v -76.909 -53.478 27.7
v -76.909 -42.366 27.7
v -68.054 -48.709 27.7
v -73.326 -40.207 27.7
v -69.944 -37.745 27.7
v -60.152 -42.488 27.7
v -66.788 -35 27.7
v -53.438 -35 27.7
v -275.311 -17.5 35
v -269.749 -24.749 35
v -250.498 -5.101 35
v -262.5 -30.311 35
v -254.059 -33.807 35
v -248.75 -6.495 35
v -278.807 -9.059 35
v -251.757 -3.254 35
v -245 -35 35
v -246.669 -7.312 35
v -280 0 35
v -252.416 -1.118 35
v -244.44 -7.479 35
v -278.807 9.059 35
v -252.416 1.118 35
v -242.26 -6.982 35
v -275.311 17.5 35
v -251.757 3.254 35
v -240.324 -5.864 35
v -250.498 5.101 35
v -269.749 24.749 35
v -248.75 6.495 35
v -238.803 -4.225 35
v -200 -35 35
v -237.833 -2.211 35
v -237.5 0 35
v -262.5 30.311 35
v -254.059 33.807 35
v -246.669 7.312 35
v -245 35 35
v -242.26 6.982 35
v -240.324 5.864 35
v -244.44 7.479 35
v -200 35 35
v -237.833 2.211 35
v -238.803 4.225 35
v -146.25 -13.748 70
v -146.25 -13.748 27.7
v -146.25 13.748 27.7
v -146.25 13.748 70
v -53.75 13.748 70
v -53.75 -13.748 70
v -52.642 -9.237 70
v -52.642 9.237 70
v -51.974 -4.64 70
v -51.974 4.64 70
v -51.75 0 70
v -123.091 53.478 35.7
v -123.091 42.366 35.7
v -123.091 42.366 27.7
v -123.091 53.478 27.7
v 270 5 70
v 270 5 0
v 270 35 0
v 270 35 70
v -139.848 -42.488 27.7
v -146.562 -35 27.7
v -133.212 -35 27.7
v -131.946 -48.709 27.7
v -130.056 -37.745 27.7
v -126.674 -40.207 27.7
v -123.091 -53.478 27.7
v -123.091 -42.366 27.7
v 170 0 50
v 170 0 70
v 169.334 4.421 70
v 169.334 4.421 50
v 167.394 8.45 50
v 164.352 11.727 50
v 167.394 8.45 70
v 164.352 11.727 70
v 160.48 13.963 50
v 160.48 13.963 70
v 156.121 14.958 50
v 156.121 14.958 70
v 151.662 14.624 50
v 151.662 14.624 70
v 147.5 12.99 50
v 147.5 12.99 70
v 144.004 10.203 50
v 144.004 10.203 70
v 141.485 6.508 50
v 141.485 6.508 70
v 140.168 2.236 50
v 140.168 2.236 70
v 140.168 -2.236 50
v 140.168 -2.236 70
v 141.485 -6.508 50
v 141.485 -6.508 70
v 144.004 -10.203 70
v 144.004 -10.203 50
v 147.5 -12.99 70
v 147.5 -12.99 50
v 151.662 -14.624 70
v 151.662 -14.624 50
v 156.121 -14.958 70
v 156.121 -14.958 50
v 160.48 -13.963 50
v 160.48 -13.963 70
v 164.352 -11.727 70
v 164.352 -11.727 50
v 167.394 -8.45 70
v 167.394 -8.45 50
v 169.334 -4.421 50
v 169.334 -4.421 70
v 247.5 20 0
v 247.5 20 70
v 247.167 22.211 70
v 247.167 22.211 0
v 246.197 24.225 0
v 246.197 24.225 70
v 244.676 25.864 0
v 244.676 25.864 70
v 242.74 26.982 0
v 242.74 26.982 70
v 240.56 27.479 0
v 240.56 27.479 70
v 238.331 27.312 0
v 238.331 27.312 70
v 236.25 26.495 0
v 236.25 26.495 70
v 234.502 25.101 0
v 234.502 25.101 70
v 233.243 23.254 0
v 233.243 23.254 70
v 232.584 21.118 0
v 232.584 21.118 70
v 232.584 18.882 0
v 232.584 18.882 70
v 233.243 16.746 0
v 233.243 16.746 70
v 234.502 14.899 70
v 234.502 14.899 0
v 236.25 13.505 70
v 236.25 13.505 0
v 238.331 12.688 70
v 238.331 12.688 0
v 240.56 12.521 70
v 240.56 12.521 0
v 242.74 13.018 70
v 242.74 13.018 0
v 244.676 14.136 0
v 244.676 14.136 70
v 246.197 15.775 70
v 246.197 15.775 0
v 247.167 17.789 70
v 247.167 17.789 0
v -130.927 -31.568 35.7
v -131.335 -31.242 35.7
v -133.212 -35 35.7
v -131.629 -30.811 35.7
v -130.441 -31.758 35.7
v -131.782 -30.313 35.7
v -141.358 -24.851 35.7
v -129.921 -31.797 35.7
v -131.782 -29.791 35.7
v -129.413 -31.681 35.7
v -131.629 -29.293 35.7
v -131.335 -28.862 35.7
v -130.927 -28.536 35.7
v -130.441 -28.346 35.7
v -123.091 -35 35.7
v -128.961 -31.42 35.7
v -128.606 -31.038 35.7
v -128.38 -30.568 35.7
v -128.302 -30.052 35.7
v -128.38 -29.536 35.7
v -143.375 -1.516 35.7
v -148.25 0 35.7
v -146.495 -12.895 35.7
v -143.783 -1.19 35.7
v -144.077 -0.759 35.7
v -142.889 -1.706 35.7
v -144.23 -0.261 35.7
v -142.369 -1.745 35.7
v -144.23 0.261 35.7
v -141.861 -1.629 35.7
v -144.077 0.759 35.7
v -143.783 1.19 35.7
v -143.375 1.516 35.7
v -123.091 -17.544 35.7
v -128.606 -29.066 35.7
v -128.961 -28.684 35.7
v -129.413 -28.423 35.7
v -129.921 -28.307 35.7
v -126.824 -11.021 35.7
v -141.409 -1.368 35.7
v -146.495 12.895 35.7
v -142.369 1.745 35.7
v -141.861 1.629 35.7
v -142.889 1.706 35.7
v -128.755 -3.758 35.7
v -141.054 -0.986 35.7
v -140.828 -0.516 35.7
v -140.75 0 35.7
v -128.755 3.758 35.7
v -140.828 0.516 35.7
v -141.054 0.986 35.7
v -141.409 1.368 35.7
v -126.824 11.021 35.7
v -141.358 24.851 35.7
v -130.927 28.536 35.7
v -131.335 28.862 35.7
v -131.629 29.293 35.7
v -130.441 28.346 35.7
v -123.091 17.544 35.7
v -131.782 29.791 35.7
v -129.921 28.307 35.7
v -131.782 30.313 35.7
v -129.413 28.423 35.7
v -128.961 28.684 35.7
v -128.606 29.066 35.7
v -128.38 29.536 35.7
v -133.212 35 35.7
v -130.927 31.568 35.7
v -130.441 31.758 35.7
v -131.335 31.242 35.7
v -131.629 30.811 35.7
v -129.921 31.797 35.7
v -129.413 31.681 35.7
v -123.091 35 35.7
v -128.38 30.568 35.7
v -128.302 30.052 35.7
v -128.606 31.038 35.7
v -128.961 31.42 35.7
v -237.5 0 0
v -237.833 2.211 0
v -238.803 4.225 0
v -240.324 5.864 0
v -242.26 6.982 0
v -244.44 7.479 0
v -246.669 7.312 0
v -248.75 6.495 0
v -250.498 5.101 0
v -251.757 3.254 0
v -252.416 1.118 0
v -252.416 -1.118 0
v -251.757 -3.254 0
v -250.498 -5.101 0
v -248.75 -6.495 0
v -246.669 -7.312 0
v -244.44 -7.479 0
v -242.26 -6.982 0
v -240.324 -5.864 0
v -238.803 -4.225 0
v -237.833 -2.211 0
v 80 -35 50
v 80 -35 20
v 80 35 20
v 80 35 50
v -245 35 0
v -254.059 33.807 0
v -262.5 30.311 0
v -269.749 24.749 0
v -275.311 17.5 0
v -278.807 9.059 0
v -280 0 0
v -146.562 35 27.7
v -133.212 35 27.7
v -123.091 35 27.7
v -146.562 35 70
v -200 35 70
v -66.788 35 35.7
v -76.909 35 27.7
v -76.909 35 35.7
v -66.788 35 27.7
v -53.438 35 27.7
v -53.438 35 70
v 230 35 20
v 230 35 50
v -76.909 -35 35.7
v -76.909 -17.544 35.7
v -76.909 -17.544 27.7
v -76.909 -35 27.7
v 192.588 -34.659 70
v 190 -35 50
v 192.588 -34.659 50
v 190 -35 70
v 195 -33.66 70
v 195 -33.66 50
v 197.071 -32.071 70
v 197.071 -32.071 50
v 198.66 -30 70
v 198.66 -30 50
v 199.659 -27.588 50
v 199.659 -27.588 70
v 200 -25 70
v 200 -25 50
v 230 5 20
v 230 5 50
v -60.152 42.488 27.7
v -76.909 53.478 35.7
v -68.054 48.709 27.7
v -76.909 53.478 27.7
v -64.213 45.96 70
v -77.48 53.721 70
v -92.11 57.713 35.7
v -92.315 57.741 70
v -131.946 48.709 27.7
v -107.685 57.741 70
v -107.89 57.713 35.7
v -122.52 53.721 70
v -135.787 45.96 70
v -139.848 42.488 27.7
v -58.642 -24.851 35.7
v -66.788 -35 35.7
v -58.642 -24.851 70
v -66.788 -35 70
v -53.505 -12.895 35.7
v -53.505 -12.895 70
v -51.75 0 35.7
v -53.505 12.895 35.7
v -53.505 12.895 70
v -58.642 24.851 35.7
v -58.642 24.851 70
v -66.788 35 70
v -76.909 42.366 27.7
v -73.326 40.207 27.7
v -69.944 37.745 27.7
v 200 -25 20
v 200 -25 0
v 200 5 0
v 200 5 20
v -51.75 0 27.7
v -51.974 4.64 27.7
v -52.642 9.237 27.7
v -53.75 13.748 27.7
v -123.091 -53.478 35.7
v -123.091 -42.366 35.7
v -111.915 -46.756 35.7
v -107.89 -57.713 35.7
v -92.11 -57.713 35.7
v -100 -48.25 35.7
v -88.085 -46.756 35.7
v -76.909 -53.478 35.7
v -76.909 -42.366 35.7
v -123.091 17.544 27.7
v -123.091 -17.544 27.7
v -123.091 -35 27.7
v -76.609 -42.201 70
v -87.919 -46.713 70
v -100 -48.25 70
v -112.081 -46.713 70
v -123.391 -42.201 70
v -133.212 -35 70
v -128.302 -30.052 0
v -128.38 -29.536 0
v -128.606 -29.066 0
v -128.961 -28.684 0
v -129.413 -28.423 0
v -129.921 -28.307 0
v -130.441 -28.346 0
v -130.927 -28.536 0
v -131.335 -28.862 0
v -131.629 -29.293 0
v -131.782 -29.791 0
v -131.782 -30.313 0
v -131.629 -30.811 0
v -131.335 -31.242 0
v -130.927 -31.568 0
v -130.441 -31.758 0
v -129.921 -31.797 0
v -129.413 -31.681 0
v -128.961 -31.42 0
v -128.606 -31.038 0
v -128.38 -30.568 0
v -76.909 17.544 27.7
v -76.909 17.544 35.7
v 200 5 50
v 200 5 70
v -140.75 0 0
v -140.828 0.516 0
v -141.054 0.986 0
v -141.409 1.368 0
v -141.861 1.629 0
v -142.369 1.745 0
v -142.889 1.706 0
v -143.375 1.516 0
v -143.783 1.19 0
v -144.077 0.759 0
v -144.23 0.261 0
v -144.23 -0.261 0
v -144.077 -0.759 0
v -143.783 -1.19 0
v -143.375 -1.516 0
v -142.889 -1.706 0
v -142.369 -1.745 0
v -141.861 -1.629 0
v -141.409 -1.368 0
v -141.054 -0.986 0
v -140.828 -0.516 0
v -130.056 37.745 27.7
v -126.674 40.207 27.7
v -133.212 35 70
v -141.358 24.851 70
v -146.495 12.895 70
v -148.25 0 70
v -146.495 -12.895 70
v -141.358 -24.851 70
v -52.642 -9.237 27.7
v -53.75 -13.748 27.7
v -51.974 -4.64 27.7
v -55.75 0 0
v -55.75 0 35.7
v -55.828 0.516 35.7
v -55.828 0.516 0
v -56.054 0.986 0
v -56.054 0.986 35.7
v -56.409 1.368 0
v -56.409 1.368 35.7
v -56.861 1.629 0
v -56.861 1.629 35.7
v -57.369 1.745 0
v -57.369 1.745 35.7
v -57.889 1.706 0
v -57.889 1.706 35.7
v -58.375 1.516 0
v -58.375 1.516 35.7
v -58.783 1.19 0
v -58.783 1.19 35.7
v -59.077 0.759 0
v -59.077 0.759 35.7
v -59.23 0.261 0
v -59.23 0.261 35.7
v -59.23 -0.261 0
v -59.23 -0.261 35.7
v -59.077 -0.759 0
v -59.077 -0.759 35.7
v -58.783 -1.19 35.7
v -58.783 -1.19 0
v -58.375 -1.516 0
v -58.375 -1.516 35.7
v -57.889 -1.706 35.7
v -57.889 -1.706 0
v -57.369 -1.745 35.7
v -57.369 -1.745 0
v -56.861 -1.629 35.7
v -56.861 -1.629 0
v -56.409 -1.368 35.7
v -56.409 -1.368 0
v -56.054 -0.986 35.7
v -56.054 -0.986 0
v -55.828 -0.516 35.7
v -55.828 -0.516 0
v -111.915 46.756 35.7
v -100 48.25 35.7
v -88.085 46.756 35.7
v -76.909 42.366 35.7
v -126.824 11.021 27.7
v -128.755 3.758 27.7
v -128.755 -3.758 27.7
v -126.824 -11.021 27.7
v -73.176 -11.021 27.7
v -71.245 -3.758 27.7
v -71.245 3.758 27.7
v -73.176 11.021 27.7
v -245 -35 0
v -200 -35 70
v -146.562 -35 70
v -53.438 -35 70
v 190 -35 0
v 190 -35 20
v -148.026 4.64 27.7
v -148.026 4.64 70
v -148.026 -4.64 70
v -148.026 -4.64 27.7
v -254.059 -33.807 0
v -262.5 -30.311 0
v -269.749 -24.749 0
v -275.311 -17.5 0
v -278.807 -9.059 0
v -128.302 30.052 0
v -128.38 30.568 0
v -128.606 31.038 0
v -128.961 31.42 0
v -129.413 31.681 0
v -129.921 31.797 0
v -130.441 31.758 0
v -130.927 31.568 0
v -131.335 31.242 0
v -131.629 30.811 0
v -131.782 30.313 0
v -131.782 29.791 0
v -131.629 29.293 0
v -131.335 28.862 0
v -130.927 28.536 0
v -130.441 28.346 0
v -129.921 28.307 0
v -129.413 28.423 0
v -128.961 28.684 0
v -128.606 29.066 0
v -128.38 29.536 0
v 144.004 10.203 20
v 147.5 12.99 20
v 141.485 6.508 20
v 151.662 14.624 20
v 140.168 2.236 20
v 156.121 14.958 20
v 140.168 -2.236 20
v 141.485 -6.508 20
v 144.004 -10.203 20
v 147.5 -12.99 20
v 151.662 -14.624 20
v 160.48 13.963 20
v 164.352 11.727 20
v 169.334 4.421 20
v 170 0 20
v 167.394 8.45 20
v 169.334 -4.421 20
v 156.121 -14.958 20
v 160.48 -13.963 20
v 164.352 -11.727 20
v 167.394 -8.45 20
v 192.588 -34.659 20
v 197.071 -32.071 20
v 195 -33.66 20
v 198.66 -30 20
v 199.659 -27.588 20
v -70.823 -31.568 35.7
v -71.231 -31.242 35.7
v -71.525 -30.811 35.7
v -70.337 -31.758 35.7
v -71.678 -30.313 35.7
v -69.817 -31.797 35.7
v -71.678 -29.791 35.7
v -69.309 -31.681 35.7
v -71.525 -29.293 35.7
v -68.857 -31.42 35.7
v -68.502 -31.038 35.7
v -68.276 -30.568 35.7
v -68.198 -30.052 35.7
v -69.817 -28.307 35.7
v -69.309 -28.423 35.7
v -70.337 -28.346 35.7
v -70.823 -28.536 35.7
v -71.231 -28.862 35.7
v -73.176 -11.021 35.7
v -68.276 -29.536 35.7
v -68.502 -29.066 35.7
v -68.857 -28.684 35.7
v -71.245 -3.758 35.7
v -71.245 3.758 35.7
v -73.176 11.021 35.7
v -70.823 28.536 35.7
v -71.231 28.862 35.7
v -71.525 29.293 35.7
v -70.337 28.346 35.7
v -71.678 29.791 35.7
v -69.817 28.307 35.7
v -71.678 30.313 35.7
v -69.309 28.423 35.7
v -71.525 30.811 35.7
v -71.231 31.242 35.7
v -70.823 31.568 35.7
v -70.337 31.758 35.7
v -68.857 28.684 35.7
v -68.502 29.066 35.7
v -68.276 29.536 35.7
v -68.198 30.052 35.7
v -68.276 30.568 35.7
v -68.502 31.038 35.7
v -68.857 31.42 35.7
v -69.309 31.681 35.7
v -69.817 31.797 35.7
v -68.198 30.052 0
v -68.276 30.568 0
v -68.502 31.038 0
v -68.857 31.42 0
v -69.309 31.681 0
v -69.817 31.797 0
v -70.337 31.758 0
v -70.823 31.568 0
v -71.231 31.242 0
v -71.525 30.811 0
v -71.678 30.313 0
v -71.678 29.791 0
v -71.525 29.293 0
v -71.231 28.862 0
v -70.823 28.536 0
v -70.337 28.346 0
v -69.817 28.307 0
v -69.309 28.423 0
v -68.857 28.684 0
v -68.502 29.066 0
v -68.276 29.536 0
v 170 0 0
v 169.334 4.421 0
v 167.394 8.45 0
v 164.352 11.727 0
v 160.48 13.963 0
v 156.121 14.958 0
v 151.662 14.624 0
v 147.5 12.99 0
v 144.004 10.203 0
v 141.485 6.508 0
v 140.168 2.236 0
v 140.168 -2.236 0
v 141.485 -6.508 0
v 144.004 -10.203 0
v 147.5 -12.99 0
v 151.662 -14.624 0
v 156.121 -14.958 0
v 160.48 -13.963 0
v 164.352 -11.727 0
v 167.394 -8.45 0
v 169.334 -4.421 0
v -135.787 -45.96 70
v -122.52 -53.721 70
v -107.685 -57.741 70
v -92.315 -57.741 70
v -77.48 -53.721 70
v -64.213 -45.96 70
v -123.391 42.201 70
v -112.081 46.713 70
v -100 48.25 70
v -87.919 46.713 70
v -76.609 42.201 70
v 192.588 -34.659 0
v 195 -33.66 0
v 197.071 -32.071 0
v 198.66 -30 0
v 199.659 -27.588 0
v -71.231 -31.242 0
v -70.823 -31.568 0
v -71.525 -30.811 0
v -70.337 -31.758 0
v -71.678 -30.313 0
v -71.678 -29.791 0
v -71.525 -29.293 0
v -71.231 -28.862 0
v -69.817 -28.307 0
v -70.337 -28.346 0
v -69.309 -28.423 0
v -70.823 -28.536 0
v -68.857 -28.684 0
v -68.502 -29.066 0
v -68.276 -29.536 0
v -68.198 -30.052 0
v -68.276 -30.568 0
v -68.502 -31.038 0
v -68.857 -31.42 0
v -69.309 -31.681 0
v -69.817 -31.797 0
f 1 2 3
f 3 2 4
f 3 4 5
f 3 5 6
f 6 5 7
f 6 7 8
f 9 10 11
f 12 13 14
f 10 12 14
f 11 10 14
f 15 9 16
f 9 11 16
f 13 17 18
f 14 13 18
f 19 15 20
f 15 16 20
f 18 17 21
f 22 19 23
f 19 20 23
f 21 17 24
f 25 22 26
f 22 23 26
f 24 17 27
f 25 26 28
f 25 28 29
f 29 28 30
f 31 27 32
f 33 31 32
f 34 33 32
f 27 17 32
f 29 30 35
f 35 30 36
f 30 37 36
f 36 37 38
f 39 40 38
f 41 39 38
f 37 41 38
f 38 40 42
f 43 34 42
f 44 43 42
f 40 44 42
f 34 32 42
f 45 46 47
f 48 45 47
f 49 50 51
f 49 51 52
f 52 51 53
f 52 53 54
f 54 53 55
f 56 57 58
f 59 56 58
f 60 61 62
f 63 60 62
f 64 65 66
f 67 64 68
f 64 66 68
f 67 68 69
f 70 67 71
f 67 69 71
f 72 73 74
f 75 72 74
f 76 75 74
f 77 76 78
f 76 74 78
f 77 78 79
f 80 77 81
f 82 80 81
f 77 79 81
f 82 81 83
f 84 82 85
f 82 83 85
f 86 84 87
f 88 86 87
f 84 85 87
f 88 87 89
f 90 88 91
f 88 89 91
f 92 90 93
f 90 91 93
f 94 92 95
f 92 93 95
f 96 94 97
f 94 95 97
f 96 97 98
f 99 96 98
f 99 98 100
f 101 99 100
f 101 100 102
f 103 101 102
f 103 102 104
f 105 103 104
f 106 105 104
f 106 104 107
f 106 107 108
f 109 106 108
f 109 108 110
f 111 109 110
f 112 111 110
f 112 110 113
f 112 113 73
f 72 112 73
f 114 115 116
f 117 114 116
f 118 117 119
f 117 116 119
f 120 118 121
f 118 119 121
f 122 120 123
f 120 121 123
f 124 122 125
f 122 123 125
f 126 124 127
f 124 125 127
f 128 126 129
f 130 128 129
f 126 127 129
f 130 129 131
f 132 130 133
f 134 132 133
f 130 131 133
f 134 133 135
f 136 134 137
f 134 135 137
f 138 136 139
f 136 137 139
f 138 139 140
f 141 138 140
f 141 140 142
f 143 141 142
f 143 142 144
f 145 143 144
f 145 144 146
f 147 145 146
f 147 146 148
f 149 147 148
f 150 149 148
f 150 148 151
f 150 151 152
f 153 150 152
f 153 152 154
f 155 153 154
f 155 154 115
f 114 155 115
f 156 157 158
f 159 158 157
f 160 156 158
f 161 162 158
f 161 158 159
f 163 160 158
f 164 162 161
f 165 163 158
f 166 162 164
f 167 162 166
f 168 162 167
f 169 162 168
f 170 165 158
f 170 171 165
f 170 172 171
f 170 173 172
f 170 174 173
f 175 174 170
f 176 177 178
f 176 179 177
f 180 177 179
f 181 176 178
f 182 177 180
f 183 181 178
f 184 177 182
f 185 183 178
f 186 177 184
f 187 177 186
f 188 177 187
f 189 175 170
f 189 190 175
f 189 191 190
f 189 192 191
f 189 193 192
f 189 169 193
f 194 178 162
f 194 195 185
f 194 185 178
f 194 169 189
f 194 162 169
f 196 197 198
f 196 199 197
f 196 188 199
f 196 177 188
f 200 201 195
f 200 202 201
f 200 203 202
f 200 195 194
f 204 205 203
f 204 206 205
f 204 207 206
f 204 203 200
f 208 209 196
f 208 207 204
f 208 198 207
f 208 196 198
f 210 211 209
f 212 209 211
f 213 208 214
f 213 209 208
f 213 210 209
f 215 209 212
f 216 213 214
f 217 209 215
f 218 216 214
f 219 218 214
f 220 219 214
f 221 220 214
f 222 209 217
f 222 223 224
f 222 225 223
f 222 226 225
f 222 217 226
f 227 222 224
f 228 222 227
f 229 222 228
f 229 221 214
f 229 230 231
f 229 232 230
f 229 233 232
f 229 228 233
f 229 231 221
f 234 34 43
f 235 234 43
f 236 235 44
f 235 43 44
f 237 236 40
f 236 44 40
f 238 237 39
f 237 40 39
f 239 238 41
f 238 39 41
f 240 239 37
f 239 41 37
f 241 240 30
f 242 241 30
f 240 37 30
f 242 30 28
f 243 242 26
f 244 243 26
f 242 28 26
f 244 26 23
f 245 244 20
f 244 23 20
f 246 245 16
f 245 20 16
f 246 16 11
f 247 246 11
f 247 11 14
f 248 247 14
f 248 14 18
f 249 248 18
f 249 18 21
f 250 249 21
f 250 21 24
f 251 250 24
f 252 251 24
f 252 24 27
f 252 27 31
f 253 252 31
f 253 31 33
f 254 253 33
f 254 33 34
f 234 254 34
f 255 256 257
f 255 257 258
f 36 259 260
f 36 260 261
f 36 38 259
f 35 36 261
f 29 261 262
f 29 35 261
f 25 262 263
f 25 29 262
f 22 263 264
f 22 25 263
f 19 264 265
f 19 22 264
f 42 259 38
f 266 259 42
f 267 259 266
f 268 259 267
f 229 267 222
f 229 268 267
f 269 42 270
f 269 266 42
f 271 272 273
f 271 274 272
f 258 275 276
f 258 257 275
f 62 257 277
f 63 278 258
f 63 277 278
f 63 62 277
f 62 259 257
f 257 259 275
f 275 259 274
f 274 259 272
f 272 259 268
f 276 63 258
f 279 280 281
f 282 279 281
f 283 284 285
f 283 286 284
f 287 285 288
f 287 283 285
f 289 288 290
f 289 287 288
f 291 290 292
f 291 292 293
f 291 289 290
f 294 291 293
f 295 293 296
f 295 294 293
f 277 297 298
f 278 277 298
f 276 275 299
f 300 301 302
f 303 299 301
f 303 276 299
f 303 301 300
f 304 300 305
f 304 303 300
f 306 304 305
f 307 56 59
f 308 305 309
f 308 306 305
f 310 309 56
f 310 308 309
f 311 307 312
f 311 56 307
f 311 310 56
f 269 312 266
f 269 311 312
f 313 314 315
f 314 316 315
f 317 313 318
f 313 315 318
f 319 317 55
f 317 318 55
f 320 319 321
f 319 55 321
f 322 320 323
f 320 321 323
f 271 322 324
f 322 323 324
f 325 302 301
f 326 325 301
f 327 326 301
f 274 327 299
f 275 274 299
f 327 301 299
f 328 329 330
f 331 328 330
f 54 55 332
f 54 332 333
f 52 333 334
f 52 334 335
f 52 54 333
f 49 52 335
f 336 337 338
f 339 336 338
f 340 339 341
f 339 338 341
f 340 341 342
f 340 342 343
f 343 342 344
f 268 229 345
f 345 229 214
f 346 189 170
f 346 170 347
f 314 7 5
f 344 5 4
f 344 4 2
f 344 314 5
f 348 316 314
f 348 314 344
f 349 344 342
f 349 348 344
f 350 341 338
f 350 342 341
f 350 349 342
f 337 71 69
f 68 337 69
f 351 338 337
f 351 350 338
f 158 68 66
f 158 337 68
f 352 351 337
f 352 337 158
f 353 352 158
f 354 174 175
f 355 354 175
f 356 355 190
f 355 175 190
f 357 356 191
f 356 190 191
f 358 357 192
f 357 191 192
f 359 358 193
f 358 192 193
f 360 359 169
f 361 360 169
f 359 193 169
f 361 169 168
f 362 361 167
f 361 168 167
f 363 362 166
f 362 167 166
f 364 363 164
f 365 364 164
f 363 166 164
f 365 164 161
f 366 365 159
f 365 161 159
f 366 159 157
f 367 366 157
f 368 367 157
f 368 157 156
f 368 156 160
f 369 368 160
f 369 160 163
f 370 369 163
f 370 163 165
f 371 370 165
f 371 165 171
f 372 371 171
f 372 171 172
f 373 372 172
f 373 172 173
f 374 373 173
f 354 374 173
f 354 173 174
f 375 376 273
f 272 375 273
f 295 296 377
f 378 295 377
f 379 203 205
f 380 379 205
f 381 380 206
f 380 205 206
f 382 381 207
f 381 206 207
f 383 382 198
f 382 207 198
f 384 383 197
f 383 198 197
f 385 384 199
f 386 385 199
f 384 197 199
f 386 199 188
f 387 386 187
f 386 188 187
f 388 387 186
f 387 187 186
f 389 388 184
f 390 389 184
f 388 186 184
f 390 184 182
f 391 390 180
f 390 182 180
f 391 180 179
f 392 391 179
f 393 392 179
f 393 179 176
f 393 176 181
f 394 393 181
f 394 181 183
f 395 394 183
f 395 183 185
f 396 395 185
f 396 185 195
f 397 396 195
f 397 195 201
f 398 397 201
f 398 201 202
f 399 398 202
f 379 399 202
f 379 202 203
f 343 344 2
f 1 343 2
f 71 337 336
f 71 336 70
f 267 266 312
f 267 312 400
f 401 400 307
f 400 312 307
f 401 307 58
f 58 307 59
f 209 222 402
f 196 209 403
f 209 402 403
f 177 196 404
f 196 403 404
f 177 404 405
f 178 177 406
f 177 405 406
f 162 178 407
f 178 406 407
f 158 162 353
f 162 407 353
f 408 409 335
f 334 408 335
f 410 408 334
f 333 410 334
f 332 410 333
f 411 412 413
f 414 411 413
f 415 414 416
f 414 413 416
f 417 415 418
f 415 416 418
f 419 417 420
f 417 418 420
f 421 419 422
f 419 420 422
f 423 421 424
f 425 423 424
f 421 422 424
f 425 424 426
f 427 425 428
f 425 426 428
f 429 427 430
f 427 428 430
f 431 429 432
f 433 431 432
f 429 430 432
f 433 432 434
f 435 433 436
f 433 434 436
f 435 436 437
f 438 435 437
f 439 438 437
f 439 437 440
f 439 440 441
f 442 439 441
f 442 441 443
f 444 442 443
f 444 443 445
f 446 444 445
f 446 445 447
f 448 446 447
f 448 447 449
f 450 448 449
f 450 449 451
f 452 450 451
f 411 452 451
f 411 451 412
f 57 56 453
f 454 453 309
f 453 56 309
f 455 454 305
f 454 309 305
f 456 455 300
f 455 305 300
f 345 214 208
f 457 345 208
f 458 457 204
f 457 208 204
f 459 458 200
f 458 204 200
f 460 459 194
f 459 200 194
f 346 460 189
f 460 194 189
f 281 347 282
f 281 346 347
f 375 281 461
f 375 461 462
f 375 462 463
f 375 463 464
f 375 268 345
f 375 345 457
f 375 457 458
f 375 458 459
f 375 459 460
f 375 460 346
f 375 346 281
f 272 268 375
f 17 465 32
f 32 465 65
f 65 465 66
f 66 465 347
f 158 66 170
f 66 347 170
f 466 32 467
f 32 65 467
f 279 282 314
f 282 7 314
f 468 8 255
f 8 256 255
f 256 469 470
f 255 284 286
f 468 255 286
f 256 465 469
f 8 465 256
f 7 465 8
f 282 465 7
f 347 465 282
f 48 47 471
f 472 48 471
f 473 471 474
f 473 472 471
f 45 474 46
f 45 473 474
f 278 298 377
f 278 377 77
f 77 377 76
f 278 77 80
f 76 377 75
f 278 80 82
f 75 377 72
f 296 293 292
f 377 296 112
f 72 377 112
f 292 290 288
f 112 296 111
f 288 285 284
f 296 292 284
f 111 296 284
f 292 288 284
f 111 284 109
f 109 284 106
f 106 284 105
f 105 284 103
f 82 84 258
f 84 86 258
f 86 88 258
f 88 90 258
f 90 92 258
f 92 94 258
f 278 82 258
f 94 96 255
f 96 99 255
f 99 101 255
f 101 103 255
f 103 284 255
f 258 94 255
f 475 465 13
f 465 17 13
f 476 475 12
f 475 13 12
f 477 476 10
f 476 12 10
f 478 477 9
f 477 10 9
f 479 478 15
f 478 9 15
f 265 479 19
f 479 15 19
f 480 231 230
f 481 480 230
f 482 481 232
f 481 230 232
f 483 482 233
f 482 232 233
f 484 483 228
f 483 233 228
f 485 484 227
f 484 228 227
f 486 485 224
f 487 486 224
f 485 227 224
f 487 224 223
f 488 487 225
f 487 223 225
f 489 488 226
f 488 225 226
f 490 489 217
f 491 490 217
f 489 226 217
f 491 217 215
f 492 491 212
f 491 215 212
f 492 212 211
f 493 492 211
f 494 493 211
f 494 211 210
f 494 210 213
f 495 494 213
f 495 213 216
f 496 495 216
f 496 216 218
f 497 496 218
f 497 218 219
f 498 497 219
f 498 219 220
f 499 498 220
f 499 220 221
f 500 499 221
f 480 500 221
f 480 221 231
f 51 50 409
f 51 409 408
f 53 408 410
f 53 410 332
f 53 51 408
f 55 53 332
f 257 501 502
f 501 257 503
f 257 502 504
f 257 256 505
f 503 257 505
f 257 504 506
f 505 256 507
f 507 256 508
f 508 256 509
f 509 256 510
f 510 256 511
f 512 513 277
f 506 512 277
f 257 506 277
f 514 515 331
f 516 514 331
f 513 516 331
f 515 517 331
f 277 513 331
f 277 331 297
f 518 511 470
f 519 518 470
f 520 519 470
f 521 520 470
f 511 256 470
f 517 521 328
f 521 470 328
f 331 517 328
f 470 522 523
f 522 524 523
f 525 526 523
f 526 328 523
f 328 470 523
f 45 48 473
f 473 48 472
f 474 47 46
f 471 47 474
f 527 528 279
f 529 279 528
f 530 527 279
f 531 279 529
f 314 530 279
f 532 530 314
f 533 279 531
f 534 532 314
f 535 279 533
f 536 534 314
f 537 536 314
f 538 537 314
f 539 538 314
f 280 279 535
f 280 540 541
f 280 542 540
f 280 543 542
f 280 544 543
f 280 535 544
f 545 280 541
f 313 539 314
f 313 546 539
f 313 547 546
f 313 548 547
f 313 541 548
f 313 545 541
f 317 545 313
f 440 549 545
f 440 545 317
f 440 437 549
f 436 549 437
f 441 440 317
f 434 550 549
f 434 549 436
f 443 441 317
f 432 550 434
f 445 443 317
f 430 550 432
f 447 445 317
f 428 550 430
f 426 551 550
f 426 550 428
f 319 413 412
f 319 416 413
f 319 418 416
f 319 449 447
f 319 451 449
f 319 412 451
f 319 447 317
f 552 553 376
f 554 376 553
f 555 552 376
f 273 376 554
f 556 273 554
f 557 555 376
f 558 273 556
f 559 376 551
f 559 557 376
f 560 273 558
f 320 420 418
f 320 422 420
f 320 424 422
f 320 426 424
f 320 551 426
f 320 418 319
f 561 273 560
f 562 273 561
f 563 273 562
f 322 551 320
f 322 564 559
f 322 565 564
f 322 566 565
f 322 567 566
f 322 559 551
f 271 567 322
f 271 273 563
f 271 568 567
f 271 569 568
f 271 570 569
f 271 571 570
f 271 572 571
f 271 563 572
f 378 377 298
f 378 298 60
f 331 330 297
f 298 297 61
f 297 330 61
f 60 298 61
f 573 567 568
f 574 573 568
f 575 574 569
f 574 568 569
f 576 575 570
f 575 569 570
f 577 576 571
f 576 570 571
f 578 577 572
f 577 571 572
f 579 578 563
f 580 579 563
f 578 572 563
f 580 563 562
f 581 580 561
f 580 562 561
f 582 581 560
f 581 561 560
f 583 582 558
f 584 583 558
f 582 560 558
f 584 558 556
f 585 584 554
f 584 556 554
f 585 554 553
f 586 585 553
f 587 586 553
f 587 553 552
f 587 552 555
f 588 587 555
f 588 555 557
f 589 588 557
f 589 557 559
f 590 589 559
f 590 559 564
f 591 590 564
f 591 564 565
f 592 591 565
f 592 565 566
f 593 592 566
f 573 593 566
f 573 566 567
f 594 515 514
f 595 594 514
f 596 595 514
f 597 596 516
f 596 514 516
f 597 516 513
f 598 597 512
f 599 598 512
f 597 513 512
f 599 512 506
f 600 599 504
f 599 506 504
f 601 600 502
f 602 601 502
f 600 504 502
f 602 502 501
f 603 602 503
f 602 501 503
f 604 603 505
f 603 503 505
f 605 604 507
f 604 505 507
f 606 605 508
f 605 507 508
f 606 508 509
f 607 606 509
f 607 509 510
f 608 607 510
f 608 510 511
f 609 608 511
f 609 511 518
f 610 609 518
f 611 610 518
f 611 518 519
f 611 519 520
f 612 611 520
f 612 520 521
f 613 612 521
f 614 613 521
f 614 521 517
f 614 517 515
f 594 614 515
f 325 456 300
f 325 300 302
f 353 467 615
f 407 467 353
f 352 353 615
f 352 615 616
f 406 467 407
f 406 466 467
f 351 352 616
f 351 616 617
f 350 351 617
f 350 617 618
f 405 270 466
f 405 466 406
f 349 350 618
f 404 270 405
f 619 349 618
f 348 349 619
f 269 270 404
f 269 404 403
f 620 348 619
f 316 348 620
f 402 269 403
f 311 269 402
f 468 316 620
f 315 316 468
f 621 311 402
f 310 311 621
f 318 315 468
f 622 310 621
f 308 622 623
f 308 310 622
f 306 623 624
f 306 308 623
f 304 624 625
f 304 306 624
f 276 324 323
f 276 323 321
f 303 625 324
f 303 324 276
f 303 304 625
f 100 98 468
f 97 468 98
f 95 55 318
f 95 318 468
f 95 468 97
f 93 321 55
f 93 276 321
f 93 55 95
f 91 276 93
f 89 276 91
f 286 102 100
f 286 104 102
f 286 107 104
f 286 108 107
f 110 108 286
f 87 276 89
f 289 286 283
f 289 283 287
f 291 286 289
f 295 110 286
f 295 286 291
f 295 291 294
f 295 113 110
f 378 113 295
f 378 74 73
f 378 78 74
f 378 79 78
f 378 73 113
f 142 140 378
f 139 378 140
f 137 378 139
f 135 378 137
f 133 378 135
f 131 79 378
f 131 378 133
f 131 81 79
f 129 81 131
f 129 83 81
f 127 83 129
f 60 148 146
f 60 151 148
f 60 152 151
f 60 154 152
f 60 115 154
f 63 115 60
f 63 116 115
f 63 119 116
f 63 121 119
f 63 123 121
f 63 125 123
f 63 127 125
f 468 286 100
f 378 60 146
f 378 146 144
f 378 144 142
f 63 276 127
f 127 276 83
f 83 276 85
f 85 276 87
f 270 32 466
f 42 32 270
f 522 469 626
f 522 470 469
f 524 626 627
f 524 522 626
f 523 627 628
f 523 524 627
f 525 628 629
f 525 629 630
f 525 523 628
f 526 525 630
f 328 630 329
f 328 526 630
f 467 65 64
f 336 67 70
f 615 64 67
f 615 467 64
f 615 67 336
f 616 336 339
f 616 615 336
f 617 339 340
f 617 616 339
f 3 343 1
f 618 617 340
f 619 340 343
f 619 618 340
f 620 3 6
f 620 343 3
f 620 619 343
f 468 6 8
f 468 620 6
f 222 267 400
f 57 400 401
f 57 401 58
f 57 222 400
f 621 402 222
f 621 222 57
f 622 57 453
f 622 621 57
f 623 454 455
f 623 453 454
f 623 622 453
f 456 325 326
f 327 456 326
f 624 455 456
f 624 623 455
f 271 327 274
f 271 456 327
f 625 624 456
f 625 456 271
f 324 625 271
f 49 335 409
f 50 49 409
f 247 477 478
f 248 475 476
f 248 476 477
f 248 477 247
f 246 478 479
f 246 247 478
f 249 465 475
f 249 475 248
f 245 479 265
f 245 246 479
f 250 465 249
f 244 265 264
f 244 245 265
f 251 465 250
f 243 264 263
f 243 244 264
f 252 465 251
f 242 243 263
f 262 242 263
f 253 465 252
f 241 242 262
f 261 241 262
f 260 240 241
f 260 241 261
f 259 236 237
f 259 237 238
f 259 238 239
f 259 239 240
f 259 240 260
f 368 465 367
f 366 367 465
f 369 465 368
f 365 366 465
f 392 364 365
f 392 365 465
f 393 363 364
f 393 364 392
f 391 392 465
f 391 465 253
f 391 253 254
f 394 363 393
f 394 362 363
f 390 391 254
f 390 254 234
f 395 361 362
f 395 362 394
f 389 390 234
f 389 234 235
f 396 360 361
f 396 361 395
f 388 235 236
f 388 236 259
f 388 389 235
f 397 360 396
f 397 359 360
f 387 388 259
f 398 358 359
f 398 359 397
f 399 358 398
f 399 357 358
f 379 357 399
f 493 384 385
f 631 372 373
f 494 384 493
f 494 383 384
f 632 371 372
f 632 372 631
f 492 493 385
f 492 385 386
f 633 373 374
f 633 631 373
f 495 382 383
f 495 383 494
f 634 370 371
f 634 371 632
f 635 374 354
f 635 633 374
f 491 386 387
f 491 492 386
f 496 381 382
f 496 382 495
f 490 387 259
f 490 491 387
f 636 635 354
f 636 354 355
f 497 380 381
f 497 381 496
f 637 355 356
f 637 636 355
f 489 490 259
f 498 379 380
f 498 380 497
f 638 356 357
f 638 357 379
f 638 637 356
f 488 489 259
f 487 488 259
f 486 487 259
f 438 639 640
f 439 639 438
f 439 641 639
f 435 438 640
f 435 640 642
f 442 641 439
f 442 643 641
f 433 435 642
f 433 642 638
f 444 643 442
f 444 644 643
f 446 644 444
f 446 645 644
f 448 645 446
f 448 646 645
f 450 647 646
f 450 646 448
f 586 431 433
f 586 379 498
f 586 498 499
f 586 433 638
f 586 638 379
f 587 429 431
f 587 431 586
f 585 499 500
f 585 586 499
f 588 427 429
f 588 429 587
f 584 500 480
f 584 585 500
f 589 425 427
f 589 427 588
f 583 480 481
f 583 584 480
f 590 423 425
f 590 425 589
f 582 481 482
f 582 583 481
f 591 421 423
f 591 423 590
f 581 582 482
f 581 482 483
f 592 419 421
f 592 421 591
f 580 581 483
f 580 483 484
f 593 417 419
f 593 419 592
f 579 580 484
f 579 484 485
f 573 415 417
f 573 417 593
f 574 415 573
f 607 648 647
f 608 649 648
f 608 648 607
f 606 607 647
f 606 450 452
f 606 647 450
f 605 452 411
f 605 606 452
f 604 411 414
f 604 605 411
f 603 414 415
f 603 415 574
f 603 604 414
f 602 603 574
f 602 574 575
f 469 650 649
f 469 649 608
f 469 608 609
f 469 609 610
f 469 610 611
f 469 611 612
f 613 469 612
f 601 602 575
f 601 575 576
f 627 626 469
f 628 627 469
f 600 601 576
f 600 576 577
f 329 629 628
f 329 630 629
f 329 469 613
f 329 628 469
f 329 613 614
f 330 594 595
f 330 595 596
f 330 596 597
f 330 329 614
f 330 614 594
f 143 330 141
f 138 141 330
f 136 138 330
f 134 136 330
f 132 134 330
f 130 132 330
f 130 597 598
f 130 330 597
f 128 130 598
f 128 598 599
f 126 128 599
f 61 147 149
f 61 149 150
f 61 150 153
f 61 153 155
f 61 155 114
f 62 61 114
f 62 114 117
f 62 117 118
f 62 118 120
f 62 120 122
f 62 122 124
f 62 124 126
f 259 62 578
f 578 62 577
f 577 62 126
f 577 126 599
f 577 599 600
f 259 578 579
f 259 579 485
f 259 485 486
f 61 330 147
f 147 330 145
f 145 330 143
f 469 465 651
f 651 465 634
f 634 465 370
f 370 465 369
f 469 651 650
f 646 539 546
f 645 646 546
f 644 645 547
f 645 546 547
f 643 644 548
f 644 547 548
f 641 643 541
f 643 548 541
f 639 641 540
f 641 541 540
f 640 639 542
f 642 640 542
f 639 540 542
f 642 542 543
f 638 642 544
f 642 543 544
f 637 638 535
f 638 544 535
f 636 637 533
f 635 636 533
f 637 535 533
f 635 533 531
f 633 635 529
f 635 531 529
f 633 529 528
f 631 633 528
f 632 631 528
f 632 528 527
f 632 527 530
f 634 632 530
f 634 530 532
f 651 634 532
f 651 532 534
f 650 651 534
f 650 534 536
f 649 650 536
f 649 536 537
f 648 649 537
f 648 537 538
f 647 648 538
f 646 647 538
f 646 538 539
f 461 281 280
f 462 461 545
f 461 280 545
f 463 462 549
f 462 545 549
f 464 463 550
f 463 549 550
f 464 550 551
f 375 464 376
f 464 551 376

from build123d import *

# Parameters (mm, degrees)
SKETCH_2_W           = 400
SKETCH_2_H           = 70
SKETCH_2_W_2         = 70
SKETCH_2_H_2         = 30
EXTRUDE_2_DEPTH      = 70
SKETCH_3_R           = 7.5
SKETCH_3_R_2         = 15
CUT_EXTRUDE_1_DEPTH  = 282.113855937
SKETCH_4_W           = 120
SKETCH_4_H           = 30
SKETCH_4_W_2         = 30
CUT_EXTRUDE_2_DEPTH  = 120
FILLET_1_R           = 10
SKETCH_5_R           = 48.25
CUT_EXTRUDE_3_DEPTH  = 34.3
EXTRUDE_3_DEPTH      = 42.3
EXTRUDE_4_DEPTH      = 42.3
EXTRUDE_4_2_DEPTH    = 42.3
SKETCH_8_R           = 1.75
CUT_EXTRUDE_4_DEPTH  = 42.3
SKETCH_11_R          = 29
CUT_EXTRUDE_6_DEPTH  = 8
CUT_EXTRUDE_7_DEPTH  = 8
SKETCH_13_W          = 35
SKETCH_13_H          = 70
EXTRUDE_5_DEPTH      = 80
FILLET_2_R           = 35
SKETCH_14_R          = 7.5
CUT_EXTRUDE_8_DEPTH  = 295.436856558
SKETCH_15_W          = 46.18239298
SKETCH_15_H          = 8
CUT_EXTRUDE_10_DEPTH = 500


with BuildPart() as part:
    # 草图2 → 凸台-拉伸2 (new body)
    with BuildSketch(Plane.XY):
        Rectangle(SKETCH_2_W, SKETCH_2_H)
        with Locations((235, 20)):
            Rectangle(SKETCH_2_W_2, SKETCH_2_H_2)
    extrude(amount=EXTRUDE_2_DEPTH)

    # 草图3 → 切除-拉伸1 (cut, through all)
    with BuildSketch(Plane.XY.offset(70)):
        with Locations((240, 20)):
            Circle(SKETCH_3_R)
        with Locations((155, 0)):
            Circle(SKETCH_3_R_2)
    extrude(amount=-CUT_EXTRUDE_1_DEPTH, mode=Mode.SUBTRACT)

    # 草图4 → 切除-拉伸2 (cut)
    with BuildSketch(Plane.XZ.offset(35)):
        with Locations((140, 35)):
            Rectangle(SKETCH_4_W, SKETCH_4_H)
        with Locations((215, 35)):
            Rectangle(SKETCH_4_W_2, SKETCH_4_H)
    extrude(amount=-CUT_EXTRUDE_2_DEPTH, mode=Mode.SUBTRACT)

    # 圆角1
    fillet_1_edges = [part.edges().sort_by_distance(p)[0] for p in [
        (200, -35, 60),
        (200, -35, 10),
    ]]
    fillet(fillet_1_edges, radius=FILLET_1_R)

    # 草图5 → 切除-拉伸3 (cut)
    with BuildSketch(Plane.XY.offset(70)):
        with Locations((-100, 0)):
            Circle(SKETCH_5_R)
    extrude(amount=-CUT_EXTRUDE_3_DEPTH, mode=Mode.SUBTRACT)

    # 草图6 → 凸台-拉伸3 (add)
    with BuildSketch(Plane.XY.offset(70)):
        with BuildLine():
            ThreePointArc((-51.75, 0), (-55.668520983, -19.046849298), (-66.787615262, -35))
            Line((-66.787615262, -35), (-53.437541946, -35))
            ThreePointArc((-53.437541946, -35), (-44.749091946, -18.449923013), (-41.75, 0))
            ThreePointArc((-41.75, 0), (-44.749091946, 18.449923013), (-53.437541946, 35))
            Line((-53.437541946, 35), (-66.787615262, 35))
            ThreePointArc((-66.787615262, 35), (-55.668520983, 19.046849298), (-51.75, 0))
        make_face()
        with BuildLine():
            Line((-53.437541946, -35), (-66.787615262, -35))
            ThreePointArc((-66.787615262, -35), (-148.25, 0), (-66.787615262, 35))
            Line((-66.787615262, 35), (-53.437541946, 35))
            ThreePointArc((-53.437541946, 35), (-158.25, 0), (-53.437541946, -35))
        make_face()
        with BuildLine():
            ThreePointArc((-51.75, 0), (-55.668520983, -19.046849298), (-66.787615262, -35))
            Line((-66.787615262, -35), (-53.437541946, -35))
            ThreePointArc((-53.437541946, -35), (-44.749091946, -18.449923013), (-41.75, 0))
            ThreePointArc((-41.75, 0), (-44.749091946, 18.449923013), (-53.437541946, 35))
            Line((-53.437541946, 35), (-66.787615262, 35))
            ThreePointArc((-66.787615262, 35), (-55.668520983, 19.046849298), (-51.75, 0))
        make_face()
    extrude(amount=-EXTRUDE_3_DEPTH)

    # 草图8 → 切除-拉伸4 (cut)
    with BuildSketch(Plane.XY.offset(35.7)):
        with Locations((-142.5, 0)):
            Circle(SKETCH_8_R)
        with Locations((-130.0520382, 30.0520382)):
            Circle(SKETCH_8_R)
        with Locations((-100, 42.5)):
            Circle(SKETCH_8_R)
        with Locations((-69.9479618, 30.0520382)):
            Circle(SKETCH_8_R)
        with Locations((-57.5, 0)):
            Circle(SKETCH_8_R)
        with Locations((-69.9479618, -30.0520382)):
            Circle(SKETCH_8_R)
        with Locations((-100, -42.5)):
            Circle(SKETCH_8_R)
        with Locations((-130.0520382, -30.0520382)):
            Circle(SKETCH_8_R)
    extrude(amount=-CUT_EXTRUDE_4_DEPTH, mode=Mode.SUBTRACT)

    # 草图11 → 切除-拉伸6 (cut)
    with BuildSketch(Plane.XY.offset(35.7)):
        with Locations((-100, 0)):
            Circle(SKETCH_11_R)
    extrude(amount=-CUT_EXTRUDE_6_DEPTH, mode=Mode.SUBTRACT)

    # 草图12 → 切除-拉伸7 (cut)
    with BuildSketch(Plane.XY.offset(35.7)):
        with BuildLine():
            Line((-100, 29), (-100, 35))
            Line((-100, 35), (-123.09119649, 35))
            Line((-123.09119649, 35), (-123.09119649, 17.544134195))
            ThreePointArc((-123.09119649, 17.544134195), (-112.888368949, 25.978644034), (-100, 29))
        make_face()
        with BuildLine():
            Line((-76.90880351, 17.544134195), (-76.90880351, 35))
            Line((-76.90880351, 35), (-100, 35))
            Line((-100, 35), (-100, 29))
            ThreePointArc((-100, 29), (-87.111631051, 25.978644034), (-76.90880351, 17.544134195))
        make_face()
        with BuildLine():
            ThreePointArc((-100, -29), (-107.281043458, -28.071095564), (-114.09564598, -25.34389008))
            Line((-114.09564598, -25.34389008), (-114.09564598, -35))
            Line((-114.09564598, -35), (-100, -35))
            Line((-100, -35), (-100, -29))
        make_face()
        with BuildLine():
            Line((-85.90435402, -35), (-85.90435402, -25.34389008))
            ThreePointArc((-85.90435402, -25.34389008), (-92.718956542, -28.071095564), (-100, -29))
            Line((-100, -29), (-100, -35))
            Line((-100, -35), (-85.90435402, -35))
        make_face()
    extrude(amount=-CUT_EXTRUDE_7_DEPTH, mode=Mode.SUBTRACT)

    # 草图13 → 凸台-拉伸5 (add)
    with BuildSketch(Plane.ZY.offset(200)):
        with Locations((17.5, 0)):
            Rectangle(SKETCH_13_W, SKETCH_13_H)
    extrude(amount=EXTRUDE_5_DEPTH)

    # 圆角2
    fillet_2_edges = [part.edges().sort_by_distance(p)[0] for p in [
        (-280, 35, 17.5),
        (-280, -35, 17.5),
    ]]
    fillet(fillet_2_edges, radius=FILLET_2_R - 0.0001)  # a hair under: the kernel refuses the full size

    # 草图14 → 切除-拉伸8 (cut, through all)
    with BuildSketch(Plane.XY.offset(70)):
        with Locations((-245, 0)):
            Circle(SKETCH_14_R)
    extrude(amount=-CUT_EXTRUDE_8_DEPTH, mode=Mode.SUBTRACT)

    # 草图15 → 切除-拉伸10 (cut, symmetric)
    with BuildSketch(Plane(origin=(0, 35, 0), x_dir=(1, 0, 0), z_dir=(0, 1, 0))):
        with Locations((-100, -31.7)):
            Rectangle(SKETCH_15_W, SKETCH_15_H)
    extrude(amount=CUT_EXTRUDE_10_DEPTH, both=True, mode=Mode.SUBTRACT)


with BuildPart() as body_2:
    # 草图7 → 凸台-拉伸4 (new body)
    with BuildSketch(Plane.XY.offset(70)):
        with BuildLine():
            Line((-146.25, -13.747727085), (-146.25, 13.747727085))
            ThreePointArc((-146.25, 13.747727085), (-148.25, 0), (-146.25, -13.747727085))
        make_face()
    extrude(amount=-EXTRUDE_4_DEPTH)


with BuildPart() as body_3:
    # 草图7 → Extrude 4 2 (new body)
    with BuildSketch(Plane.XY.offset(70)):
        with BuildLine():
            ThreePointArc((-51.75, 0), (-52.252617873, 6.946221995), (-53.75, 13.747727085))
            Line((-53.75, 13.747727085), (-53.75, -13.747727085))
            ThreePointArc((-53.75, -13.747727085), (-52.252617873, -6.946221995), (-51.75, 0))
        make_face()
    extrude(amount=-EXTRUDE_4_2_DEPTH)


solid = Compound([part.part, body_2.part, body_3.part])
